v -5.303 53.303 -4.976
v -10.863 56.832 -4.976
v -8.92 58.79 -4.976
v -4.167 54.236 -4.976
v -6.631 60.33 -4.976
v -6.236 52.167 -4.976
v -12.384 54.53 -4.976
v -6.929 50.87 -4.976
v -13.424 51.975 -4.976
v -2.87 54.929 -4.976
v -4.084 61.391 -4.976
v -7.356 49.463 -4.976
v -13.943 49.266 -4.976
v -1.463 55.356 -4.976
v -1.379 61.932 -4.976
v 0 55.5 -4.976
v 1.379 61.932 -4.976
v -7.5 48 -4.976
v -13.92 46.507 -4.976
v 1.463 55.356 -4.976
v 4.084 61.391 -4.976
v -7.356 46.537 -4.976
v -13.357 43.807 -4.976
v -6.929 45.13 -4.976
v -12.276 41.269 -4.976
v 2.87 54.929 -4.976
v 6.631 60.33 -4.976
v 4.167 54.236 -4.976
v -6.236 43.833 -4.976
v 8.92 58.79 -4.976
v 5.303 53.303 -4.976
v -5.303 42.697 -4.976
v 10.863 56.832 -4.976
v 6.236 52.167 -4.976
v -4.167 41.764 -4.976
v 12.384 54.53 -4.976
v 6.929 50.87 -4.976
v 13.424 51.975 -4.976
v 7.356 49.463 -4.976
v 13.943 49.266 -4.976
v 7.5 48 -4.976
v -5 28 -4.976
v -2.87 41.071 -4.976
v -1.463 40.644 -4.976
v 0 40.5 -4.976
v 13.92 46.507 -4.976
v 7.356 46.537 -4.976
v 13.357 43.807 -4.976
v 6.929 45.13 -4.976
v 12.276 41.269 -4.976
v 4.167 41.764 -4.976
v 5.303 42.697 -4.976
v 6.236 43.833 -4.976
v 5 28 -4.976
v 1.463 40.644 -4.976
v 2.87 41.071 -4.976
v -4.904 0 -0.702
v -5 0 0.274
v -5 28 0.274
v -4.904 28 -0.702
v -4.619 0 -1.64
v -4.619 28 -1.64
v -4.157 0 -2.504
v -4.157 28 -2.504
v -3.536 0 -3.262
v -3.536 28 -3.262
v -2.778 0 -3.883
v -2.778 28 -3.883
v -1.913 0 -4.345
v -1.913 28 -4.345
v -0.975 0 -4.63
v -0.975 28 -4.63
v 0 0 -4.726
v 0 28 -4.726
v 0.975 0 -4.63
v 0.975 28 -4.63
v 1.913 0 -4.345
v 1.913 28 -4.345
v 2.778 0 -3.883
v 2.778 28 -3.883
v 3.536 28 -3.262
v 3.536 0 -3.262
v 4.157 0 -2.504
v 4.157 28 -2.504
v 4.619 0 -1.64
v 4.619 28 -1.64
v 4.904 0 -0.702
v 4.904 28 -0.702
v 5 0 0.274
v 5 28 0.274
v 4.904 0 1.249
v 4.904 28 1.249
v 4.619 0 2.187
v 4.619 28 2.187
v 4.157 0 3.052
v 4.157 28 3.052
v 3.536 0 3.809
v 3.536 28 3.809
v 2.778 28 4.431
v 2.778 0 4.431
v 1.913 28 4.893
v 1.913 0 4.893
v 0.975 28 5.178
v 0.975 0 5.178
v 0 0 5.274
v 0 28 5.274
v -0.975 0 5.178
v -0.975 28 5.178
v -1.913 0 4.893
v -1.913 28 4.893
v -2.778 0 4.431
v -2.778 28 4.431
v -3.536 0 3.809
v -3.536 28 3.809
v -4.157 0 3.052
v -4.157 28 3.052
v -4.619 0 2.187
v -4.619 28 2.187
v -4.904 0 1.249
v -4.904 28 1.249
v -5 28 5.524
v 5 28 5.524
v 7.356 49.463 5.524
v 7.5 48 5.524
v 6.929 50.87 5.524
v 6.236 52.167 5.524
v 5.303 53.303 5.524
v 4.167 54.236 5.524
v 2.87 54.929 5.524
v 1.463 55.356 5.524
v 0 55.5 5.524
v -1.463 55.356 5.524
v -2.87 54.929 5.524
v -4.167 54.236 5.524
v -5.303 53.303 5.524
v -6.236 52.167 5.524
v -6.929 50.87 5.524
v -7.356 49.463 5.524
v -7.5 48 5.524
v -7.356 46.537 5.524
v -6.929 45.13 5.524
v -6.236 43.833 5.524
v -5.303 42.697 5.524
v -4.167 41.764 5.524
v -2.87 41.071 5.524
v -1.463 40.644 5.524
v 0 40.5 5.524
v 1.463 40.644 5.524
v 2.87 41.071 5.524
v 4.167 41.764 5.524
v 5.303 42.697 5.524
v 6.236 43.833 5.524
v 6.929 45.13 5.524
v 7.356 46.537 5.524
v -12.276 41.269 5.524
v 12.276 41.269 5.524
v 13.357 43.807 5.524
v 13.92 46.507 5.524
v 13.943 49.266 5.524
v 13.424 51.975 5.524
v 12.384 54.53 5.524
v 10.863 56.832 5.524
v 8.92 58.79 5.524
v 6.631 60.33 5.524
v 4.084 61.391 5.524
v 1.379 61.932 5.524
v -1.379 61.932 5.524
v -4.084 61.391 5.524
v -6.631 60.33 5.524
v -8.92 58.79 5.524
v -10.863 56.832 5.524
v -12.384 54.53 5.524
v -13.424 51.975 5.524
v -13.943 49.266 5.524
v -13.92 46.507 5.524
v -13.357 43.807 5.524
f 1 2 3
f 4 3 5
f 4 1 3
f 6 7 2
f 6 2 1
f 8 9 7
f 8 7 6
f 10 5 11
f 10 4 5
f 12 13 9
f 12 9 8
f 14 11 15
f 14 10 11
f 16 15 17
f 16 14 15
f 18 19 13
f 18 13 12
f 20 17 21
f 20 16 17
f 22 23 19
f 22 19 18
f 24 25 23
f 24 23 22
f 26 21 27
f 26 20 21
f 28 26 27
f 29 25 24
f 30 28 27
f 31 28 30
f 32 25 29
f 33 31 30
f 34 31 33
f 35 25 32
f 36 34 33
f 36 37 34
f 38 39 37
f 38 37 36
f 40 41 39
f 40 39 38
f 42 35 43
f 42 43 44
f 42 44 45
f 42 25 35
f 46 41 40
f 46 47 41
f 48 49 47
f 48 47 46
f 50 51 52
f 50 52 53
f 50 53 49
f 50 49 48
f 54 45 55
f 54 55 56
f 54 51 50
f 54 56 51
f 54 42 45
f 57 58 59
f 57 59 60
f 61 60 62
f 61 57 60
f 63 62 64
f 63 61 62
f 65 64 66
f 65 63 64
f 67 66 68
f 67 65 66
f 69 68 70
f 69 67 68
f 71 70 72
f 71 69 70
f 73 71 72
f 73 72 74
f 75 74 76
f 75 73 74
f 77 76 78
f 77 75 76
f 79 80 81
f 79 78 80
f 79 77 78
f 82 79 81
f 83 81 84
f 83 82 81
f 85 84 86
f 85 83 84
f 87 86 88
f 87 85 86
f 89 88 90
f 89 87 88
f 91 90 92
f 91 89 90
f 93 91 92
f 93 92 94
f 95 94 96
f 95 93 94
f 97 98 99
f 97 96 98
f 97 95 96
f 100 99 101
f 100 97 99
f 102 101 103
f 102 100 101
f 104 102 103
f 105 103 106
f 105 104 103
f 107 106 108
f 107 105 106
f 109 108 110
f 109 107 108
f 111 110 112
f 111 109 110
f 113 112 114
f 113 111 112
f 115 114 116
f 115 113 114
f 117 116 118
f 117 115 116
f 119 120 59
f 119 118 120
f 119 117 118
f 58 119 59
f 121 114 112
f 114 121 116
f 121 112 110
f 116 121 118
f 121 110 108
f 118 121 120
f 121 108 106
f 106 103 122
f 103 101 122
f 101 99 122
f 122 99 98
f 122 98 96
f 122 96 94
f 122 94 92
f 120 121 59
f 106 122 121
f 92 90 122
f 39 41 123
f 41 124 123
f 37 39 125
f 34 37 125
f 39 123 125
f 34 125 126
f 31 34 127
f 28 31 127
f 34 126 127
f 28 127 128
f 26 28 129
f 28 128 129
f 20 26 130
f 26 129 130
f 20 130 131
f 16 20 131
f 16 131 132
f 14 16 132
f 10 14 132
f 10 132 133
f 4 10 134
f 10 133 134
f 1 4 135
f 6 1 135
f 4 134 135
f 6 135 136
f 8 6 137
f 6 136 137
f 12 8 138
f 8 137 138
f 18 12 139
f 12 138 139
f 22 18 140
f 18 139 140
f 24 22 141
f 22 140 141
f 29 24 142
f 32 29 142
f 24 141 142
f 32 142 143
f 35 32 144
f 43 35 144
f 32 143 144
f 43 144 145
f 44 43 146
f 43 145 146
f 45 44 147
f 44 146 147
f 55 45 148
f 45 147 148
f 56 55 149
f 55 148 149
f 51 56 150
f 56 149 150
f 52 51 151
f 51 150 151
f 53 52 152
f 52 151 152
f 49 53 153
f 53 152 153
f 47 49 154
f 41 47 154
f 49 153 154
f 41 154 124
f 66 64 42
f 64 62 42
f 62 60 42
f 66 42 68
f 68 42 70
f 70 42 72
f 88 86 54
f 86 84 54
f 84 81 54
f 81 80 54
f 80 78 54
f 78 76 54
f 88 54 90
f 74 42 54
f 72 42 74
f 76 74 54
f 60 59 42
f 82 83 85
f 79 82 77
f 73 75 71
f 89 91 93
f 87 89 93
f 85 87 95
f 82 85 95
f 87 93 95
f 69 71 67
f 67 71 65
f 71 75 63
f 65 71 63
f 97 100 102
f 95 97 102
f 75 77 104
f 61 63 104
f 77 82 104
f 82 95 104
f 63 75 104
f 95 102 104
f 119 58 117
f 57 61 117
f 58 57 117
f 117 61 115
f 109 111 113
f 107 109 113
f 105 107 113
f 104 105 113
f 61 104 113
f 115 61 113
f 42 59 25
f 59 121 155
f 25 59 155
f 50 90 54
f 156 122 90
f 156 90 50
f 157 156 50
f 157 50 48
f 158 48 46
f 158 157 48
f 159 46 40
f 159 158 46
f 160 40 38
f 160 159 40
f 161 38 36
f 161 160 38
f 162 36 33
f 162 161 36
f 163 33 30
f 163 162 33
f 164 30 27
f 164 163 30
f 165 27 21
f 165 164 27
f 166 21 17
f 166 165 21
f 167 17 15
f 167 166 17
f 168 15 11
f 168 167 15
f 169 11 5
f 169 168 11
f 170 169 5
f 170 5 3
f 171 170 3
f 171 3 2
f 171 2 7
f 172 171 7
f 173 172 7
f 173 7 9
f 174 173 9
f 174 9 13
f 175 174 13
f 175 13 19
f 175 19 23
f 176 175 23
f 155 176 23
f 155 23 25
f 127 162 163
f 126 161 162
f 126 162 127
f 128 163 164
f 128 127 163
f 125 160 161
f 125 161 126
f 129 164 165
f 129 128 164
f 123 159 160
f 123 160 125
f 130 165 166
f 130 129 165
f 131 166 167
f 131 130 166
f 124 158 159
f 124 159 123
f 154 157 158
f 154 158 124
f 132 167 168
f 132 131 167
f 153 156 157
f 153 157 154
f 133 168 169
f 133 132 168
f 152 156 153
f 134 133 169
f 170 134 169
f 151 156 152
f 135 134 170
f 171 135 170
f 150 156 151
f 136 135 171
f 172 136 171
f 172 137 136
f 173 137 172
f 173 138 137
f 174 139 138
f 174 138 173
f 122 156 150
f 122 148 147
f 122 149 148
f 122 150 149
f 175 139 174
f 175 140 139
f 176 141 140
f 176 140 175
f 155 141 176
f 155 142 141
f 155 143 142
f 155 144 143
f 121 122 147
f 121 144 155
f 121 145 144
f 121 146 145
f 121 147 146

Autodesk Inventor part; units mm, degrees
ref_plane "YZ Plane" through (0, 0, 0) normal (1, 0, 0) x (0, 1, 0)
ref_plane "XZ Plane" through (0, 0, 0) normal (0, 1, 0) x (-1, 0, 0)
ref_plane "XY Plane" through (0, 0, 0) normal (0, 0, 1) x (1, 0, 0)
sketch "Sketch1" plane through (0, 0, 0) normal (0, 1, 0) x (-1, 0, 0)
  circle A0 centre (0, 0.2739) radius 5
  point P0 (0, 0)
  dimension "d0" = 10
extrude "Extrusion1" add sketch "Sketch1" along normal blind 28
sketch "Sketch3" plane through (0, 28, 0.2739) normal (0, 1, 0) x (1, 0, 0)
  line L0 (14, -5.25) -> (-14, -5.25)
  line L1 (-14, -5.25) -> (-14, 5.25)
  line L2 (-14, 5.25) -> (14, 5.25)
  line L3 (14, 5.25) -> (14, -5.25)
  line L4 (14, -5.25) -> (-14, 5.25) construction
  line L5 (-14, -5.25) -> (14, 5.25) construction
  circle A0 centre (0, 0) radius 5 projected
  point P0 (0, 0.2739)
  point P1 (0, 0)
  dimension "d5" = 28
  dimension "d6" = 10.5
  dimension "d16" = 5.25
extrude "Extrusion2" add sketch "Sketch3" along normal blind 34 contours L0 L1 L2 L3 | A0
sketch "Sketch4" plane through (-14, 28, 5.5239) normal (0, 0, 1) x (1, 0, 0)
  circle A0 centre (14, 20) radius 7.5
  line L0 (9, -28) -> (19, -28) projected
  line L1 (28, 0) -> (28, 34) projected
  circle A1 centre (14, 20) radius 14
  line L2 (19, 0) -> (9, 0) projected
  line L3 (9, 0) -> (1.7243, 13.2689)
  line L4 (19, -28) -> (19, 0) projected
  line L5 (19, 0) -> (26.2757, 13.2689)
  line L6 (19, 0) -> (28, 0)
  line L7 (28, 0) -> (28, 20)
  line L8 (28, 0) -> (0, 0) projected
  line L9 (0, 0) -> (9, 0)
  line L10 (0, 0) -> (0, 20)
  line L11 (0, 0) -> (0, 34) projected
  line L12 (0, 20) -> (0, 34)
  line L13 (0, 34) -> (14, 34)
  line L14 (0, 34) -> (28, 34) projected
  line L15 (14, 34) -> (28, 34)
  line L16 (28, 34) -> (28, 20)
  point P0 (14, -28)
  dimension "d9" = 15
  dimension "d10" = 48
  dimension "d11" = 14
  dimension "d12" = 28
  dimension "d13" = 13.2689
extrude "Extrusion3" cut sketch "Sketch4" against normal blind 34 contours A0 | L6 L5 A1 L1 | A1 L14 L1 | A1 L11 L13 | L8 L10 A1 L3
properties part number "K"
